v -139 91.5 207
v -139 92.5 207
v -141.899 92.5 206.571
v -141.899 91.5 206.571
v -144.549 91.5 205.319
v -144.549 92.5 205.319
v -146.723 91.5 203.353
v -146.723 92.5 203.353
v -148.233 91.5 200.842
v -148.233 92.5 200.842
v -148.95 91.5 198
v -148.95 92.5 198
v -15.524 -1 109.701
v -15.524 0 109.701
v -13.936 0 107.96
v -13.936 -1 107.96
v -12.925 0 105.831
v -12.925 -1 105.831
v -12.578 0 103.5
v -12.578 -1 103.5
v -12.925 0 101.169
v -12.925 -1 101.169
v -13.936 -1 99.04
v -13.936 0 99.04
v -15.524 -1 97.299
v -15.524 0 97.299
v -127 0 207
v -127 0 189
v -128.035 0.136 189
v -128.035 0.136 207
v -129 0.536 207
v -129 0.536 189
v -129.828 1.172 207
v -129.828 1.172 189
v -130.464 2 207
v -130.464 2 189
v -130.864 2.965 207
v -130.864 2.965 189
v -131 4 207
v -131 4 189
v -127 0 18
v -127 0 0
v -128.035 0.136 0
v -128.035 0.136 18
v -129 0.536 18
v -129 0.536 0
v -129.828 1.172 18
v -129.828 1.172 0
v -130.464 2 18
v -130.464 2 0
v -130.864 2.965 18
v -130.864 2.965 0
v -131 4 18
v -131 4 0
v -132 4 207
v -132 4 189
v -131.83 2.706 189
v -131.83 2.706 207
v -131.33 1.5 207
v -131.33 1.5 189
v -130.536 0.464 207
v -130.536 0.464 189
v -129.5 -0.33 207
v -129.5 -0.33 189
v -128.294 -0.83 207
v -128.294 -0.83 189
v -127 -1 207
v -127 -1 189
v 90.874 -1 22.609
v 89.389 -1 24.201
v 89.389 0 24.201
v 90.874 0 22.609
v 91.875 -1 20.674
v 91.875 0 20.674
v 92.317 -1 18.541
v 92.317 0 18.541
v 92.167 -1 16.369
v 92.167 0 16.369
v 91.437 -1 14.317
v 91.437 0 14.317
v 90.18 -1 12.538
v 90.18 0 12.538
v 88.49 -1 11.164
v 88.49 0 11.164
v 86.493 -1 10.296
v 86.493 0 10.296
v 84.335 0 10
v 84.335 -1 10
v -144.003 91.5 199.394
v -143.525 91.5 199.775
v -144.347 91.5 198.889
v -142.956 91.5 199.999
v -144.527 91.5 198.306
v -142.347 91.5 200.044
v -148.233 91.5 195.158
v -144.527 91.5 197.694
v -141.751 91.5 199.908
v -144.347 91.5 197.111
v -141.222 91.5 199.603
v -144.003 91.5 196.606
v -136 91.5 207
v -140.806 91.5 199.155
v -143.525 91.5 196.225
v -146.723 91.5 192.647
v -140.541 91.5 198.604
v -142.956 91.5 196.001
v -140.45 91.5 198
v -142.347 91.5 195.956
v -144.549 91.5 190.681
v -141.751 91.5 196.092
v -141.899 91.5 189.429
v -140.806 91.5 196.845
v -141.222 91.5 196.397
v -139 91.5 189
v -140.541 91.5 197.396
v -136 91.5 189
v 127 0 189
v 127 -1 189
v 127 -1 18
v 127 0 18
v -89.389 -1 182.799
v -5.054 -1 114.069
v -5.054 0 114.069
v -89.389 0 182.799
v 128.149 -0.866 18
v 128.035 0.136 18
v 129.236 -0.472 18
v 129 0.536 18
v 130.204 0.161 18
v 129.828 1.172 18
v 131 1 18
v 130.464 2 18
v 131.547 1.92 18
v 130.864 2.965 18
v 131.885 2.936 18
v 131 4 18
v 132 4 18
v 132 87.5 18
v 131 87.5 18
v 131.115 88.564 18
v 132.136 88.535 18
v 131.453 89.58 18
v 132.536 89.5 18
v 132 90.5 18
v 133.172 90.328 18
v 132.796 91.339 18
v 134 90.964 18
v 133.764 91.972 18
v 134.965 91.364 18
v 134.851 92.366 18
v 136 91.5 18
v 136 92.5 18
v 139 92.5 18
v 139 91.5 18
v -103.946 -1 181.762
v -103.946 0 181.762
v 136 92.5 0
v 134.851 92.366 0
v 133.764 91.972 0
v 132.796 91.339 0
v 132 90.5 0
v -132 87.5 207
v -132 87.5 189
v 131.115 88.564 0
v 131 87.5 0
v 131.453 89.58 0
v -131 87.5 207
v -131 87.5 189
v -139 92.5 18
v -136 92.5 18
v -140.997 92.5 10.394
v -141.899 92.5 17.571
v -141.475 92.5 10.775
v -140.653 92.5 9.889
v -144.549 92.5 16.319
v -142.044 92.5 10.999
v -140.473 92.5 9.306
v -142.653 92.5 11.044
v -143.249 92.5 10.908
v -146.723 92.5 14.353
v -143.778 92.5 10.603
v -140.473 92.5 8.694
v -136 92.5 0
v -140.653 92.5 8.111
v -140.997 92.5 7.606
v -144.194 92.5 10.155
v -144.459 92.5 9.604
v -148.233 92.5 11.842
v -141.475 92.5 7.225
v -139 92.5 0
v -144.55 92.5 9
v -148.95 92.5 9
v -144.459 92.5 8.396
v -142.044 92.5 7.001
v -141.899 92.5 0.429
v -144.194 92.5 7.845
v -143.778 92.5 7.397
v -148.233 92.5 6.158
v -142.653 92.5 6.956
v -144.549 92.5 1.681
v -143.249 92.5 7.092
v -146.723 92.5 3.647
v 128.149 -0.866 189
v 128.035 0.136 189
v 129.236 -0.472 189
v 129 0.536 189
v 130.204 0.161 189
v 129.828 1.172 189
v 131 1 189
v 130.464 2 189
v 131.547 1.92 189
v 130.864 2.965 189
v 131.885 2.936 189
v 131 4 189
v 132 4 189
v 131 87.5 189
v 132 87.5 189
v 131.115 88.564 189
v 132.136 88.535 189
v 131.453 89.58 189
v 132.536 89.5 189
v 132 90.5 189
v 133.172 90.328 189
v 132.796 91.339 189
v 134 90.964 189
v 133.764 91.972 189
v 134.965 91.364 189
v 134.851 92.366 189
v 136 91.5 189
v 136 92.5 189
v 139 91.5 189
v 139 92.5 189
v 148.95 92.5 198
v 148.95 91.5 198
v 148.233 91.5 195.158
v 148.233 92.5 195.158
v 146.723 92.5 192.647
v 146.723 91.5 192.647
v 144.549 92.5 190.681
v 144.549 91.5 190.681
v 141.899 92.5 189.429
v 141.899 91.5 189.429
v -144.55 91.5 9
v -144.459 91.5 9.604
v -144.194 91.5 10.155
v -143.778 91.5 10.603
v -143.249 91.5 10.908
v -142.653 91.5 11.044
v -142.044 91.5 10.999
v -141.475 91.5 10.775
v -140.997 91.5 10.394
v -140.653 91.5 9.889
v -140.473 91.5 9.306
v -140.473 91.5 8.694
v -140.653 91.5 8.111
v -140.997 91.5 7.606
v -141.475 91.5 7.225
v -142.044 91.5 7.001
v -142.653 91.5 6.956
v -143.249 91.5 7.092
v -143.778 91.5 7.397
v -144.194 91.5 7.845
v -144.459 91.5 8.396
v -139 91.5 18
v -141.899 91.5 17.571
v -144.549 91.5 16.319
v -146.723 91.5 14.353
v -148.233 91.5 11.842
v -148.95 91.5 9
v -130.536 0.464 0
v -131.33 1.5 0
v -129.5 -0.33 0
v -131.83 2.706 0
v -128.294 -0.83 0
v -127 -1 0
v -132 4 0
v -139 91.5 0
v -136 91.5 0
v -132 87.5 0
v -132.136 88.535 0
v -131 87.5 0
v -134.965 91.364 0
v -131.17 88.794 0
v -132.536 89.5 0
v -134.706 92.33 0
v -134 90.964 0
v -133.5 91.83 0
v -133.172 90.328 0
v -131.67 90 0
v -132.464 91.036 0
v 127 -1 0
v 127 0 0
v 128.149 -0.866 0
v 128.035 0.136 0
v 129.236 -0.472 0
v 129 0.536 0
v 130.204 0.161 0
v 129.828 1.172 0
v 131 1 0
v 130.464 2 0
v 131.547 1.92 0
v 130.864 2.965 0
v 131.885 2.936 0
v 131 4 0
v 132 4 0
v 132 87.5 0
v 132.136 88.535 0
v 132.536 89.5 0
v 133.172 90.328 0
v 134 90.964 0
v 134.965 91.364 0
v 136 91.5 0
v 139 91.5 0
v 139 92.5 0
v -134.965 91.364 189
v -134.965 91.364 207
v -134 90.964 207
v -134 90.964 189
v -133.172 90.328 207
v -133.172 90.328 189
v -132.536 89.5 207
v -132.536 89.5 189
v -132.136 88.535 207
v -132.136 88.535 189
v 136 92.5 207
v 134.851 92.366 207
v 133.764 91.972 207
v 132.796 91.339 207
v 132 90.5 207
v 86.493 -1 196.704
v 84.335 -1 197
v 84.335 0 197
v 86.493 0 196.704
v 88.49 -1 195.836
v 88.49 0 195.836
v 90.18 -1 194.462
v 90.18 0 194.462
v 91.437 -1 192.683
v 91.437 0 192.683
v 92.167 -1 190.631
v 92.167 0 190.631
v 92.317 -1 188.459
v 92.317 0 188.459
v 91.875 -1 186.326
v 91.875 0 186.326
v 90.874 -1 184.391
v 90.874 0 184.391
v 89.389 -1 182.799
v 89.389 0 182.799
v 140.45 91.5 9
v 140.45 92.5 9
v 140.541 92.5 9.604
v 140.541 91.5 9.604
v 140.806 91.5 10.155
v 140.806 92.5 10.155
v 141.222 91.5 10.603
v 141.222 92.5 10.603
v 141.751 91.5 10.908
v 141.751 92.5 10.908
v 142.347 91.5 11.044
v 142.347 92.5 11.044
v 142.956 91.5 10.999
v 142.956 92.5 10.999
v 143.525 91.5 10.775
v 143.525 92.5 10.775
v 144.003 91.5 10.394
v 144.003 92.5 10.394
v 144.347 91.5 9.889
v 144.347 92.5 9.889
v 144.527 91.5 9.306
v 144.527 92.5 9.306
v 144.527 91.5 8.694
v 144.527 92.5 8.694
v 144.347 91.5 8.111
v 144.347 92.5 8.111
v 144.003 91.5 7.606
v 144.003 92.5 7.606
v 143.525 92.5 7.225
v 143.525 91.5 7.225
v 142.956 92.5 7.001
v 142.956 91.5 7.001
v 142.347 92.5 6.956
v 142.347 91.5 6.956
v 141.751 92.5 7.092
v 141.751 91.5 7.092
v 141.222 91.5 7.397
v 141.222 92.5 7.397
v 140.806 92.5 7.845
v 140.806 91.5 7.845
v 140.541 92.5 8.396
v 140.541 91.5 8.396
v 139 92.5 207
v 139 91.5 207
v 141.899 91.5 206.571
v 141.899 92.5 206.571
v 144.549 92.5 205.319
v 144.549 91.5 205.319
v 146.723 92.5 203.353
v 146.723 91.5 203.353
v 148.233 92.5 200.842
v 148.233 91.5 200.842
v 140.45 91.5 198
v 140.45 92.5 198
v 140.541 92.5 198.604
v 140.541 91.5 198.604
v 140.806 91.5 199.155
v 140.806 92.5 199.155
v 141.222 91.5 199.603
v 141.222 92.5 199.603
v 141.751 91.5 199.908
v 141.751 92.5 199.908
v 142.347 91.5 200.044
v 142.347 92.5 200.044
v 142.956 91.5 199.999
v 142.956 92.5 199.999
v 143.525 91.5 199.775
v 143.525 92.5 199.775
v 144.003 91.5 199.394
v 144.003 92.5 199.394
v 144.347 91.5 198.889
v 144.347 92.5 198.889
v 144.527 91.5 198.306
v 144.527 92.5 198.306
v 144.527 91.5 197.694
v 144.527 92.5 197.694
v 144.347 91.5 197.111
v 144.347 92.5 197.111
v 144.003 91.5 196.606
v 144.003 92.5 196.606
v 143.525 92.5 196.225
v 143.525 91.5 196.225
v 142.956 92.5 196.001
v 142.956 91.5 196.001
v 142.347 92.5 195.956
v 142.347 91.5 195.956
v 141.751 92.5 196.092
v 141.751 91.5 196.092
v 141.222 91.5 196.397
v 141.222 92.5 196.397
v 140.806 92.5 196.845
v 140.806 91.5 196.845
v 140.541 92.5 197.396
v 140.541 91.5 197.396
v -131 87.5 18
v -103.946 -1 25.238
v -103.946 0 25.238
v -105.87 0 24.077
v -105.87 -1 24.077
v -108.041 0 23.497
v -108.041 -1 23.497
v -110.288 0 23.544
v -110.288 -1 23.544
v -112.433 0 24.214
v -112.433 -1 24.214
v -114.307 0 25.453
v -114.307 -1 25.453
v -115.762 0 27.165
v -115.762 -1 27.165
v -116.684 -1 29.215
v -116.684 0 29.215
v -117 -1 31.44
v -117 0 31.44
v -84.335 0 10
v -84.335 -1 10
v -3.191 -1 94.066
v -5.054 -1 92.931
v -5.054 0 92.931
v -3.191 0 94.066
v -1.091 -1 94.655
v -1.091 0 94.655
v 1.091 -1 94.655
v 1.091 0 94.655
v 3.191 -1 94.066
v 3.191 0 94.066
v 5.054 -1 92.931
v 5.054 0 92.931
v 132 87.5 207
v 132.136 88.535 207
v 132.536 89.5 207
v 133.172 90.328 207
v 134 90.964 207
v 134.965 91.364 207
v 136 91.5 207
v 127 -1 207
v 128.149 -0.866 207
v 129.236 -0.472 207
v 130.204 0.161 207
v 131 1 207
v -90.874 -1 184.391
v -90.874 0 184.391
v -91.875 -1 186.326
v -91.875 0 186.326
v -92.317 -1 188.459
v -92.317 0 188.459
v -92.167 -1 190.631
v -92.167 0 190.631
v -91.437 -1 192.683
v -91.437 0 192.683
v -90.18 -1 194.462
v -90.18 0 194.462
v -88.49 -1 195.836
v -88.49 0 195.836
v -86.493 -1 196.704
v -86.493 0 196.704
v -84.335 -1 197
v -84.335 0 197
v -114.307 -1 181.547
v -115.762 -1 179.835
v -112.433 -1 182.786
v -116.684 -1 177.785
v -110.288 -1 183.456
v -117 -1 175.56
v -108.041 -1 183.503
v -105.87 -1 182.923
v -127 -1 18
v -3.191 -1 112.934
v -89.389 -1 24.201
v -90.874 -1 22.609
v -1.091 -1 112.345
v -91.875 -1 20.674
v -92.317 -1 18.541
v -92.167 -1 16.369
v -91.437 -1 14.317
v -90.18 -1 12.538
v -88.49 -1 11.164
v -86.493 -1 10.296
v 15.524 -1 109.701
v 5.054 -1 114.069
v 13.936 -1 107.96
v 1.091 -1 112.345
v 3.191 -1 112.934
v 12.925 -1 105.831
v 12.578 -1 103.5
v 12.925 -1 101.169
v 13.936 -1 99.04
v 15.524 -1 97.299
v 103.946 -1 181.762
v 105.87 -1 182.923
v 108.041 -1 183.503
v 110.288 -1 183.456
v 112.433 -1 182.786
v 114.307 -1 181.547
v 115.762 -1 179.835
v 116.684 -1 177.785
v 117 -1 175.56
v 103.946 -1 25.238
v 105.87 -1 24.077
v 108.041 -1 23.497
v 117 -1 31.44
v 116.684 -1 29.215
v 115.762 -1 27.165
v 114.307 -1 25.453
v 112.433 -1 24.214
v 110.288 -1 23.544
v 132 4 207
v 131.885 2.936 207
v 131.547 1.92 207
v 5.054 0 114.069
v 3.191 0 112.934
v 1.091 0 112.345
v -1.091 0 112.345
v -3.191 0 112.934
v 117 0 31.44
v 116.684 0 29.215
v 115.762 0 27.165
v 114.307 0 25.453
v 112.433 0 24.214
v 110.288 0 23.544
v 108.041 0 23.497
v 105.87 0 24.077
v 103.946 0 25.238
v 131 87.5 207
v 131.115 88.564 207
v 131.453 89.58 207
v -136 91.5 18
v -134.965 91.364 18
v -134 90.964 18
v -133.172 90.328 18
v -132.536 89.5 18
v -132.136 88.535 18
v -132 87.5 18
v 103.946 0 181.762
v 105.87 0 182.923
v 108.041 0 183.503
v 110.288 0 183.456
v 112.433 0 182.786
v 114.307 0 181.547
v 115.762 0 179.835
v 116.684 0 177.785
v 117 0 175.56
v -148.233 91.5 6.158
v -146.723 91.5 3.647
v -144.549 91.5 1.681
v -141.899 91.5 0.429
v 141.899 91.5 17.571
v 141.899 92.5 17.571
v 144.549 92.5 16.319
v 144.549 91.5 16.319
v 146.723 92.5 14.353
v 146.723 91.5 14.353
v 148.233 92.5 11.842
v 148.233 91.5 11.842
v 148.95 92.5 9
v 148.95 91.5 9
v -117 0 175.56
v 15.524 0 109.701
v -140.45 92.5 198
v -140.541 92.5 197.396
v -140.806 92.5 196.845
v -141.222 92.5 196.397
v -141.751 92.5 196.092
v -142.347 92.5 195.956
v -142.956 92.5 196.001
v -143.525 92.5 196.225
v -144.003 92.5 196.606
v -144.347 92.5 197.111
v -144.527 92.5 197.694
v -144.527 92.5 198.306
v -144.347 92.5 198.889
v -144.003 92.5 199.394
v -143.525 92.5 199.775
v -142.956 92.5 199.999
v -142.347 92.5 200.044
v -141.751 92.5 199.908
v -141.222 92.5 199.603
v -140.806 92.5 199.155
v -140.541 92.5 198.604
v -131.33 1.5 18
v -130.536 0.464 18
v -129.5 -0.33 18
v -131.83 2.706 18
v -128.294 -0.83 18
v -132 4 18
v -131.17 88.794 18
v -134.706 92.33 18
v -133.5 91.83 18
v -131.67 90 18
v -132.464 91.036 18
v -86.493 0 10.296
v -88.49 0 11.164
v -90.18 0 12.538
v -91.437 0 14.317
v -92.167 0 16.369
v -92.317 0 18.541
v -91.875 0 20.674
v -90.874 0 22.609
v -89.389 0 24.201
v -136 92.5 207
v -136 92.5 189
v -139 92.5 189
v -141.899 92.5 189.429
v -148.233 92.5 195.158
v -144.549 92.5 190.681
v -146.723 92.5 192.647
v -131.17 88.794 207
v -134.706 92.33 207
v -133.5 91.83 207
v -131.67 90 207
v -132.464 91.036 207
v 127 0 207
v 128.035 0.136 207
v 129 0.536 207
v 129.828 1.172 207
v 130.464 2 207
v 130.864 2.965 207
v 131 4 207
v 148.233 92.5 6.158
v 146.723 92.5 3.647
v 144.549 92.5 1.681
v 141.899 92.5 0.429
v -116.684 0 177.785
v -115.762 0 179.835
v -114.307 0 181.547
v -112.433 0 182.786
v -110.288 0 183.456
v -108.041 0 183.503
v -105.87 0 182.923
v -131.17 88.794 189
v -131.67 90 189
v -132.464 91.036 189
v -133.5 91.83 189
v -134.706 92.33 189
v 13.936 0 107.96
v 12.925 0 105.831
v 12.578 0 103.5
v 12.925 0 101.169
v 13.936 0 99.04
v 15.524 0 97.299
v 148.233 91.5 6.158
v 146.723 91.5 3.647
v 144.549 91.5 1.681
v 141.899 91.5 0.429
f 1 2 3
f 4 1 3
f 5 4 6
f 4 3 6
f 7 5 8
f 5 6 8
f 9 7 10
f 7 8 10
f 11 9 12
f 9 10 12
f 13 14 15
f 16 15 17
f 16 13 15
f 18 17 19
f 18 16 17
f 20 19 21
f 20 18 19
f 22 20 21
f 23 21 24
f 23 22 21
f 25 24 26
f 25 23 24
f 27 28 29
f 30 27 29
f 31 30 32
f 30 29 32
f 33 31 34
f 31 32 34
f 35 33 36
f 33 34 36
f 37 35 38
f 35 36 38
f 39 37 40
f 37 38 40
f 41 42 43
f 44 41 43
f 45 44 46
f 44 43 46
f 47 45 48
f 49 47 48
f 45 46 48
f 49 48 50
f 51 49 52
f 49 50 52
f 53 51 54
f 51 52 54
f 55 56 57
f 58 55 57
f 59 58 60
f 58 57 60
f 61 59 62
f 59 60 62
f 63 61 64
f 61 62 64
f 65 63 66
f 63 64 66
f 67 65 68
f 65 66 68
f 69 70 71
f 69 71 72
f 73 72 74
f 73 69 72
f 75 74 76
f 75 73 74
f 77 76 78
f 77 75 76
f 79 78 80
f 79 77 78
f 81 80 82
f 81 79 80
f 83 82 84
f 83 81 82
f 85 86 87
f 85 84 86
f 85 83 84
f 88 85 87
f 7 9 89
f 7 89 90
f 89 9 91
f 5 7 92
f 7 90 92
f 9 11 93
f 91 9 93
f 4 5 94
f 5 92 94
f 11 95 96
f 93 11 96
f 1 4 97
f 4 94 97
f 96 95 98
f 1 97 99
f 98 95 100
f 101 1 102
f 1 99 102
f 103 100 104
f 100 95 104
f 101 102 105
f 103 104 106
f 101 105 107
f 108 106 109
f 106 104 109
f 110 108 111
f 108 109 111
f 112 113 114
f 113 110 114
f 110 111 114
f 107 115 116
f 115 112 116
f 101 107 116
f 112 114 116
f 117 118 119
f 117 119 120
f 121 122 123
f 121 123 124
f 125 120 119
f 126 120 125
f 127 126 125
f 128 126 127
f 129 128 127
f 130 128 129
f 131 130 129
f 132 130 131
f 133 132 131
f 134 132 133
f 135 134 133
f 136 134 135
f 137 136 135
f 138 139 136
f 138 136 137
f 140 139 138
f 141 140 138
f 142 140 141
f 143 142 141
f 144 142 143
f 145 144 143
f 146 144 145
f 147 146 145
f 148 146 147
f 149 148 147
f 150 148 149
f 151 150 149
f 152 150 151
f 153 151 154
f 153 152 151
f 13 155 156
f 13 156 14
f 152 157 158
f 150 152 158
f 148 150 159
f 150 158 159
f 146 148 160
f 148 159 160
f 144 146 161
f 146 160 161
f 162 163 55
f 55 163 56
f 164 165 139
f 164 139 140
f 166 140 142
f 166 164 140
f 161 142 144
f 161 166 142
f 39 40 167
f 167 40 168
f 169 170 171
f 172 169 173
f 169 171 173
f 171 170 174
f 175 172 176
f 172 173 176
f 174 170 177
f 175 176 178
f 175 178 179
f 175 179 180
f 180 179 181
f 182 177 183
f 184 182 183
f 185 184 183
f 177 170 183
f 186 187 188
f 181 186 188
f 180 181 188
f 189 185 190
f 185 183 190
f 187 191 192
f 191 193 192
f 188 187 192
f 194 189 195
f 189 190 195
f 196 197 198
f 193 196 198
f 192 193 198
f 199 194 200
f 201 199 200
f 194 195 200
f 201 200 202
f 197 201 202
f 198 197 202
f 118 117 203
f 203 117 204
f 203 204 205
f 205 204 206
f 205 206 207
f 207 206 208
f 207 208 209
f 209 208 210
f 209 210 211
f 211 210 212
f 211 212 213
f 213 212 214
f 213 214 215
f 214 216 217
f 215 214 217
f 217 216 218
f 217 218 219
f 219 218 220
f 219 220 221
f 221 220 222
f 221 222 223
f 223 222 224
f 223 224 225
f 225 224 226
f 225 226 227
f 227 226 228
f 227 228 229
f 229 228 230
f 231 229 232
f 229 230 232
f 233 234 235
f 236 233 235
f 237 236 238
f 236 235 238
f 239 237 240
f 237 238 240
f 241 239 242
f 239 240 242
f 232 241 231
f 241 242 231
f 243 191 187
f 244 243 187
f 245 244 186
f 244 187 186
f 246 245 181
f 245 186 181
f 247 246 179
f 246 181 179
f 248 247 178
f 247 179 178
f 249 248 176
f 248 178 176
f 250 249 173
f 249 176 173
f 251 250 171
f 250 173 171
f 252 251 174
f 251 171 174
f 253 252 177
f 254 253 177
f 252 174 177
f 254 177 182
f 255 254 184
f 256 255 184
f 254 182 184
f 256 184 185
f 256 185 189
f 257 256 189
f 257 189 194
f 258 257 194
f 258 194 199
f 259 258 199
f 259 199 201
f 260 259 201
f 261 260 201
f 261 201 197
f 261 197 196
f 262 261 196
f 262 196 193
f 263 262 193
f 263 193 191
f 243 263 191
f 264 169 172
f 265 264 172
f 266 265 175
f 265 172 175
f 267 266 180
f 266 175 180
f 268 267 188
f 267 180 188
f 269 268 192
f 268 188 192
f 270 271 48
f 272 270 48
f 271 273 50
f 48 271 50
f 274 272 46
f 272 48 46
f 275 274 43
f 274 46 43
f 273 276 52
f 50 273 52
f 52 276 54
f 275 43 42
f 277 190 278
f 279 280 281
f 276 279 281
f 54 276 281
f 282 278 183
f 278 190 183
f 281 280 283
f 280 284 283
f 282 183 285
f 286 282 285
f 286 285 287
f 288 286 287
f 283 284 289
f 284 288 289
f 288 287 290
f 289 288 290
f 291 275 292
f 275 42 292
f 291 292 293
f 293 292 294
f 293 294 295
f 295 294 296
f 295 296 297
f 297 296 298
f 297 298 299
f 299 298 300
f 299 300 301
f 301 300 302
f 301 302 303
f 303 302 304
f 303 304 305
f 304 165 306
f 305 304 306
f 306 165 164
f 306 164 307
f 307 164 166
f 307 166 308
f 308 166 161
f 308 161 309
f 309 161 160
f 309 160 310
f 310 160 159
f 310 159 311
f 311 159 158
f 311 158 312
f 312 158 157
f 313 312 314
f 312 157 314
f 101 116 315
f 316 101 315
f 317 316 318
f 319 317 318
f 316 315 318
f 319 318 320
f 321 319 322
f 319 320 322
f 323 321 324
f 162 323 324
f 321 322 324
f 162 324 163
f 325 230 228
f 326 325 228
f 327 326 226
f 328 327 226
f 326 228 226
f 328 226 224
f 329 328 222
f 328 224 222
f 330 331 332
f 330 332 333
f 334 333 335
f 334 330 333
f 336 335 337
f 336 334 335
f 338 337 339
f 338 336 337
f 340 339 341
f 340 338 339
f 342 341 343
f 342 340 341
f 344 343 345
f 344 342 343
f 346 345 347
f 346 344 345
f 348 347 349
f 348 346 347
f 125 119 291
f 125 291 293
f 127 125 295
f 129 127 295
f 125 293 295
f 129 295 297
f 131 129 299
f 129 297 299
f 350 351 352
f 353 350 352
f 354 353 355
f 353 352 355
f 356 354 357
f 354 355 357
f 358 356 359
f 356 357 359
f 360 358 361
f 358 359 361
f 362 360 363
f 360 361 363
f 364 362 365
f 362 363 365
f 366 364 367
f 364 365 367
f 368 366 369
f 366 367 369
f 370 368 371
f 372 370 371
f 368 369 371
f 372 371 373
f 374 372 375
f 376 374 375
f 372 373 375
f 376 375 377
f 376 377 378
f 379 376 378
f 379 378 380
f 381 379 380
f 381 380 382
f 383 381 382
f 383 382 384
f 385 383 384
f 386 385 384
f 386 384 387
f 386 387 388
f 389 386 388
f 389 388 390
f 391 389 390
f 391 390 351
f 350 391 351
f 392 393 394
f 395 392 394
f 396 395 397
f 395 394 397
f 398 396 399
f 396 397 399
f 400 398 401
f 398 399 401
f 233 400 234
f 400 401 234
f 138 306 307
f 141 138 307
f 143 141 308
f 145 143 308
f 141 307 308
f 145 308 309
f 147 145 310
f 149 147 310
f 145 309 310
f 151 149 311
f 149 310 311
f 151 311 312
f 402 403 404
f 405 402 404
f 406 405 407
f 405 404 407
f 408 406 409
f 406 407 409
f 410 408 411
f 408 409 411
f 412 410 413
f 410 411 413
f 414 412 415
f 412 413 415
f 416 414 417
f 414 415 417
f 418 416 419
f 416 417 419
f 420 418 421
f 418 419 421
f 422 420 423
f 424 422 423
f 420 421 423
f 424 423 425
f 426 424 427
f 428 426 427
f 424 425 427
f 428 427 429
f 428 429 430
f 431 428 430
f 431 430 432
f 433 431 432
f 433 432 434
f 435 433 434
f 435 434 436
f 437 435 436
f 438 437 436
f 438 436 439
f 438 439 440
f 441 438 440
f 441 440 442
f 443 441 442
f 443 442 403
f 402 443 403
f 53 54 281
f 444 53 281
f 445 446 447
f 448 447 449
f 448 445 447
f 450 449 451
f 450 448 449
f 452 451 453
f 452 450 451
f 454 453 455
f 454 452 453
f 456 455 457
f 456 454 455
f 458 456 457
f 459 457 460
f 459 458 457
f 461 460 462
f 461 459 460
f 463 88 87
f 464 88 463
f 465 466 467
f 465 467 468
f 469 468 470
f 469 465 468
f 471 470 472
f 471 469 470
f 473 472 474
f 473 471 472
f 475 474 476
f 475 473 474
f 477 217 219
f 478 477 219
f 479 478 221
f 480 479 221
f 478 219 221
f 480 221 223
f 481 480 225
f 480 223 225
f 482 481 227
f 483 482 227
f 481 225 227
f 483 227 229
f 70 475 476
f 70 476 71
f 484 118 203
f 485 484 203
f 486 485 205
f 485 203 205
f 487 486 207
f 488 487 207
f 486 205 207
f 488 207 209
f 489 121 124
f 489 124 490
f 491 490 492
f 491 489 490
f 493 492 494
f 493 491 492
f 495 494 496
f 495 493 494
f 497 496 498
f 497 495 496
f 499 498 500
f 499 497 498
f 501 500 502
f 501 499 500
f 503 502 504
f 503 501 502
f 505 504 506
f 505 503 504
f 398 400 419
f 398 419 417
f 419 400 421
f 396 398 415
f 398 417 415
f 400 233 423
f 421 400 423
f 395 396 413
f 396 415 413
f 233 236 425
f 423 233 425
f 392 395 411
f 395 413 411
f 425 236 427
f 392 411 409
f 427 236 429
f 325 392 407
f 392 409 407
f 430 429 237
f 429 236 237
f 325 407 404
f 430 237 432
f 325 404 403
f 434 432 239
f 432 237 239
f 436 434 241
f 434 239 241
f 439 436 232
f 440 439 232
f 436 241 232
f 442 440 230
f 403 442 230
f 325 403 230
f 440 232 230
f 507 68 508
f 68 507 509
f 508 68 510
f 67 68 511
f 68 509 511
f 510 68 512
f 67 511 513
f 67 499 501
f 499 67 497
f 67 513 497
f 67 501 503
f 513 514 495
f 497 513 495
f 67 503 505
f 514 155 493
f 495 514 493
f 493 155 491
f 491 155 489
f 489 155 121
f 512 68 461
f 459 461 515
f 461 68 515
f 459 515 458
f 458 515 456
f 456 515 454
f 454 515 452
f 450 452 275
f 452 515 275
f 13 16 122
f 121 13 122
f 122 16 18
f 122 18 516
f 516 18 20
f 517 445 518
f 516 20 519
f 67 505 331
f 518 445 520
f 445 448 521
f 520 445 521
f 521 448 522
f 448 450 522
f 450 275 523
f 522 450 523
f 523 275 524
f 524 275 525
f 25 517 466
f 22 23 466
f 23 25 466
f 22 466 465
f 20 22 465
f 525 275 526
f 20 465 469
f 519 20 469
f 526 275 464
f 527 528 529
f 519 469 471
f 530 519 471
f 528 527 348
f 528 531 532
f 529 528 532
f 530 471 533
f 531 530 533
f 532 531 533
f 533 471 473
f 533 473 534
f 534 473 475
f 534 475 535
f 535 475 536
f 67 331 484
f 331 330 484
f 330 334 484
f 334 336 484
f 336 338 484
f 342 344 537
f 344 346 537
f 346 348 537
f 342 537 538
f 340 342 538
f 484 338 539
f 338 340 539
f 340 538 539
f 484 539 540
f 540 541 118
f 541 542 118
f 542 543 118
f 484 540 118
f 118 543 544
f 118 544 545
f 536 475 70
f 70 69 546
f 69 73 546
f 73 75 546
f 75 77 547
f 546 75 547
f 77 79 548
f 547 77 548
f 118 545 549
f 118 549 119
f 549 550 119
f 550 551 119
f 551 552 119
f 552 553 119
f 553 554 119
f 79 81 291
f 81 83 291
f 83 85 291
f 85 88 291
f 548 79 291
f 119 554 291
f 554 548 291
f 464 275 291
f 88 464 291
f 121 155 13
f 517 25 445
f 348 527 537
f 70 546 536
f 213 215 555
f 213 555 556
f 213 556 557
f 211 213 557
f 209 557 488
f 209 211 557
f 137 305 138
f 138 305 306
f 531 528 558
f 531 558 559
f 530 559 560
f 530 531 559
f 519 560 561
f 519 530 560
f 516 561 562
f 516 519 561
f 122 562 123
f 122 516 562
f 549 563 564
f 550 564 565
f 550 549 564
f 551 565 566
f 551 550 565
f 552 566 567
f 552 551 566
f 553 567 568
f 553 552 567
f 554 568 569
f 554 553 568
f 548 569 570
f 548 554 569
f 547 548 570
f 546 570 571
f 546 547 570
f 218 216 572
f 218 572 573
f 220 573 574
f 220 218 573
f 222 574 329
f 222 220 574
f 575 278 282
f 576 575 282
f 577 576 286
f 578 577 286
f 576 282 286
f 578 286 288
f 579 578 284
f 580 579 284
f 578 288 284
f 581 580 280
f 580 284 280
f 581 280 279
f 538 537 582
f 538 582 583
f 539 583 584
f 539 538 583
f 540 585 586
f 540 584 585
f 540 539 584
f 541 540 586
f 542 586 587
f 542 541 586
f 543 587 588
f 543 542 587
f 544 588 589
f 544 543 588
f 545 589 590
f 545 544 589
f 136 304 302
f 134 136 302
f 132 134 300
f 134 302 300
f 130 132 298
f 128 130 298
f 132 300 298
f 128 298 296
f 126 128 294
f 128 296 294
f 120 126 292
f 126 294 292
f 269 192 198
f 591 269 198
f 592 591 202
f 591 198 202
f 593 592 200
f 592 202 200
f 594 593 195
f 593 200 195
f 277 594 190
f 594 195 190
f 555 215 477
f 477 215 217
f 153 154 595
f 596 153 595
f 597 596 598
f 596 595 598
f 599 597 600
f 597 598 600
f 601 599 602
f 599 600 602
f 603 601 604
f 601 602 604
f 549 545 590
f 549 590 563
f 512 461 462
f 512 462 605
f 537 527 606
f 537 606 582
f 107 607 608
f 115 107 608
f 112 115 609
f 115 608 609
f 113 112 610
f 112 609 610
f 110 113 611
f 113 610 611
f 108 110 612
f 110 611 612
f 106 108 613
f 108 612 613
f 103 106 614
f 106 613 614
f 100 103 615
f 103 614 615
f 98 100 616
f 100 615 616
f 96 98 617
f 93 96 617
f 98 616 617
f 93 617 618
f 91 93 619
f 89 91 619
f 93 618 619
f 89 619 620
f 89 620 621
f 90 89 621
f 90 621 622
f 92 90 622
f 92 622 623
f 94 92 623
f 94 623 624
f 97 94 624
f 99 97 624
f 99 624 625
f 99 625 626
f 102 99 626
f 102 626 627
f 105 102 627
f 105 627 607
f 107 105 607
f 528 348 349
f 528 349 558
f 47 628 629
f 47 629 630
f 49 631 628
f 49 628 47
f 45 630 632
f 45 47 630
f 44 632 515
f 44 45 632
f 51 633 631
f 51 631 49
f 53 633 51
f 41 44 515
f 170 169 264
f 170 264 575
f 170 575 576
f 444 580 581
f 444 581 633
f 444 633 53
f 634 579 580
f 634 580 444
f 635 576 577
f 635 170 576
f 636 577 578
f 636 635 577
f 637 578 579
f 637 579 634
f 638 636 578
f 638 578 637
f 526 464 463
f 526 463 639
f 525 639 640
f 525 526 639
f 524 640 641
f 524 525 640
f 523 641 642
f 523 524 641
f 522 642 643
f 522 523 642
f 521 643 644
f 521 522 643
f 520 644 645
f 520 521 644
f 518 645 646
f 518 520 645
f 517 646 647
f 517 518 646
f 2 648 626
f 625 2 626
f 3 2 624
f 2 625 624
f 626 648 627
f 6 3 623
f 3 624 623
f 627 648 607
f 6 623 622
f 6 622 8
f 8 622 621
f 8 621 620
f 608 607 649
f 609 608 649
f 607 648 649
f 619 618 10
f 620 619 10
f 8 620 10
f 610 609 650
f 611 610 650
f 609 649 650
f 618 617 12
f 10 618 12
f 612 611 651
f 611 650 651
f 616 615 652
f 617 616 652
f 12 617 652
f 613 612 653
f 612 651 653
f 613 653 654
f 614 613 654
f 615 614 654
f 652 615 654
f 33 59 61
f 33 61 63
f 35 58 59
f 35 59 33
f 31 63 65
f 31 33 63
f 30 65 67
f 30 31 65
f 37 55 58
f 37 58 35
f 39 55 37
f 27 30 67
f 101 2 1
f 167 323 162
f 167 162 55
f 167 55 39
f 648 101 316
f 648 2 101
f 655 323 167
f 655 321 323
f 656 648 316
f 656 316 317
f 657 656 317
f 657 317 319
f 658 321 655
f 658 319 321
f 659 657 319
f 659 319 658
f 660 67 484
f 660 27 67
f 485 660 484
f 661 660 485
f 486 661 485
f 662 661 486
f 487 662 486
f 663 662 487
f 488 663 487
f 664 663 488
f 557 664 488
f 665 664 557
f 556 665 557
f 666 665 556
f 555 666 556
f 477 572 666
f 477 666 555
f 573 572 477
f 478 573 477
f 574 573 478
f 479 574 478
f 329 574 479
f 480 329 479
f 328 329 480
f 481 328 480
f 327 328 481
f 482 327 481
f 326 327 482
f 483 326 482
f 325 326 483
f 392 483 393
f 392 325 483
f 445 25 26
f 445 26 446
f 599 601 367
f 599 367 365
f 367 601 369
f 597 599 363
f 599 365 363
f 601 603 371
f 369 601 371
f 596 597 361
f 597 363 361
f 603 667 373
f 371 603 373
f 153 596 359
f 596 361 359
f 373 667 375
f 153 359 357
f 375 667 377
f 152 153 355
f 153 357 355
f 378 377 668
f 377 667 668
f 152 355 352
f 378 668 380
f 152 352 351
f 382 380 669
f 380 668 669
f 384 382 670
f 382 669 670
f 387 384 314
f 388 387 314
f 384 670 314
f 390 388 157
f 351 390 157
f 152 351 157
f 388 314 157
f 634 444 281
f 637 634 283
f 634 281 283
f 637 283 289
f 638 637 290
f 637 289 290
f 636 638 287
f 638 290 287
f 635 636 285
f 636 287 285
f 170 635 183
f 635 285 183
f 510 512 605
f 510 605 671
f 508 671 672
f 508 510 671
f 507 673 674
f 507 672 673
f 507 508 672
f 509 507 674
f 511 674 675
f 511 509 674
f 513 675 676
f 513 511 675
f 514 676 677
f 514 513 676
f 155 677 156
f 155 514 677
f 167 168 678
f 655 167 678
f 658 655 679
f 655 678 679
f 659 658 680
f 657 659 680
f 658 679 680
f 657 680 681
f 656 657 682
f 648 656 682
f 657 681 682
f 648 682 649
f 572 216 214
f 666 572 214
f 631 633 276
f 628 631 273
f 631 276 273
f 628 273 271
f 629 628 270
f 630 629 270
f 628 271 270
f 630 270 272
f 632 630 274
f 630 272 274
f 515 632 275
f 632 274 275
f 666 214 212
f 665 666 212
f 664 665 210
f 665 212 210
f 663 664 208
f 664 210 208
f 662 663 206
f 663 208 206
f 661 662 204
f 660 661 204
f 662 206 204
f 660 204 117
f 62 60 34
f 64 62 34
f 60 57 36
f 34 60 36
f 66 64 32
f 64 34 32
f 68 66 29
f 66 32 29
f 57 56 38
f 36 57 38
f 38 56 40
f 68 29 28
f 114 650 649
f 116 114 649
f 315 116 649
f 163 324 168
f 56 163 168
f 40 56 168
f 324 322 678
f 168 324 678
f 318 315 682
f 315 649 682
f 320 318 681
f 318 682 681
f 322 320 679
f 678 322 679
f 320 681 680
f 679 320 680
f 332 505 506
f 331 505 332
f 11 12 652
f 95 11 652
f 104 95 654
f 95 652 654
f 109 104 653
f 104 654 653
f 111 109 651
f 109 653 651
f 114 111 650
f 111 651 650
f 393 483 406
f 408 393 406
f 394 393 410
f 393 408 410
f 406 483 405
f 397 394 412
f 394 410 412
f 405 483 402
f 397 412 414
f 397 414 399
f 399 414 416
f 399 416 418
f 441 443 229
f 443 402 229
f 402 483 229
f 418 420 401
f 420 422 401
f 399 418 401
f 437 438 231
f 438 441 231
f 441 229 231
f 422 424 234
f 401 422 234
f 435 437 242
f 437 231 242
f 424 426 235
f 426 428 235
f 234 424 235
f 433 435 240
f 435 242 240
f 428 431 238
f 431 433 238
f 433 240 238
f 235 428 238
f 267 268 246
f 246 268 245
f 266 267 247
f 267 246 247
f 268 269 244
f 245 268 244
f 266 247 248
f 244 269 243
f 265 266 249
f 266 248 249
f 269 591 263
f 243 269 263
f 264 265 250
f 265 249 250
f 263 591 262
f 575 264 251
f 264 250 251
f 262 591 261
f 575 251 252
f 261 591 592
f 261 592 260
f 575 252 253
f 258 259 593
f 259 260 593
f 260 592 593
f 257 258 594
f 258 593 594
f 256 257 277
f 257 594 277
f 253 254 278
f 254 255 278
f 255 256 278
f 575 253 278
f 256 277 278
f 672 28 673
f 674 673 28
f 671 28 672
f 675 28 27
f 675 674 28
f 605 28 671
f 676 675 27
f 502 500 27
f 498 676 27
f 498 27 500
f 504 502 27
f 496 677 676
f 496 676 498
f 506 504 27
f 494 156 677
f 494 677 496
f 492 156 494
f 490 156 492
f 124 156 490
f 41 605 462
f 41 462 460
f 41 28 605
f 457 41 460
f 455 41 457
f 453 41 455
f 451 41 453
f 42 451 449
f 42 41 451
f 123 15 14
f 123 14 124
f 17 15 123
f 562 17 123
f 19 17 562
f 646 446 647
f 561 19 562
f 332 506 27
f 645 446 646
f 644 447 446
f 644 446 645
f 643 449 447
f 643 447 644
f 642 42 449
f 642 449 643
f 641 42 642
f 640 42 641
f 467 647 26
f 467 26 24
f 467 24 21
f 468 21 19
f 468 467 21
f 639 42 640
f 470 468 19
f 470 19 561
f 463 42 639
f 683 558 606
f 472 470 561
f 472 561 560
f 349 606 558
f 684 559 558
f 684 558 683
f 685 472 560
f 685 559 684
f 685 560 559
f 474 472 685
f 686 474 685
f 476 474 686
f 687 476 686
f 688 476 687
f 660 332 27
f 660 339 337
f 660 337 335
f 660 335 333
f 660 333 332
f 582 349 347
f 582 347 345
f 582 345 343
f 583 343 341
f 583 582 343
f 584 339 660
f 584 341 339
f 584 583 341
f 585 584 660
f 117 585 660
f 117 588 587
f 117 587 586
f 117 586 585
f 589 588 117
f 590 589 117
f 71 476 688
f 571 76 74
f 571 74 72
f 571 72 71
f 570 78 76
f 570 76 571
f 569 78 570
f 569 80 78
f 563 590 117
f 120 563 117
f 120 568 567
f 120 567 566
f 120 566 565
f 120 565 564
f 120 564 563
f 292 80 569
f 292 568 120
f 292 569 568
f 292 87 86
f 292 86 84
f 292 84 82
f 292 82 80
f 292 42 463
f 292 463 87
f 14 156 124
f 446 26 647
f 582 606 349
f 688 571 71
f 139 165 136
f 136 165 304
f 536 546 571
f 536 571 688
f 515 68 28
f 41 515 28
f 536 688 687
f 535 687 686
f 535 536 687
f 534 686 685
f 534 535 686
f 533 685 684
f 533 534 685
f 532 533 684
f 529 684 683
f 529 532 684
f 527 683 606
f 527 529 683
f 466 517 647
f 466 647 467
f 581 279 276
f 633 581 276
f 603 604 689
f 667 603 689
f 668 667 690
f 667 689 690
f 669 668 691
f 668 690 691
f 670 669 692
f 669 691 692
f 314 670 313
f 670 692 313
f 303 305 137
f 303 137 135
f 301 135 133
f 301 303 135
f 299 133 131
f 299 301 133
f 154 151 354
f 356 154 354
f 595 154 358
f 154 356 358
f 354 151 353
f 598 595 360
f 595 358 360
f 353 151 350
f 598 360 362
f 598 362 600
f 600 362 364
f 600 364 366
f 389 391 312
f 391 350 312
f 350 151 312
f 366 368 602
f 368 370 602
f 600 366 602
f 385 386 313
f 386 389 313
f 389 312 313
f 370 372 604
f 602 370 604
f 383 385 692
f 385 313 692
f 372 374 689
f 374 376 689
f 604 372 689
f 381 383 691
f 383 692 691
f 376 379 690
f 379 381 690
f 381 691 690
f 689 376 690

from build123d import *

# Parameters (mm, degrees)
BASE_FLANGE1_DEPTH           = 207
EDGE_FLANGE1_STRIP_W         = 12
EDGE_FLANGE1_STRIP_H         = 1
EDGE_FLANGE1_STRIP_CUT_DEPTH = 207
EDGE_FLANGE1_DEPTH           = 207
EDGE_FLANGE2_STRIP_W         = 12
EDGE_FLANGE2_STRIP_H         = 1
EDGE_FLANGE2_STRIP_CUT_DEPTH = 207
EDGE_FLANGE2_DEPTH           = 207
UNFOLD1_DEPTH                = 207
UNFOLD1_2_DEPTH              = 207
SKETCH15_W                   = 171
SKETCH15_H                   = 112.207963268
CUT_EXTRUDE2_DEPTH           = 425.023399195
FOLD2_DEPTH                  = 207
FOLD2_2_OUTLINE_W            = 254
FOLD2_2_OUTLINE_H            = 1
FOLD2_2_DEPTH                = 207
FOLD2_3_DEPTH                = 18
FOLD2_START                  = 189
FOLD2_4_DEPTH                = 18
CUT_EXTRUDE3_DEPTH           = 272.647289698
SKETCH19_R                   = 2.05
CUT_EXTRUDE4_DEPTH           = 272.647289698
FILLET2_R                    = 10


# Read off the part's stored shape, not the designer's step: Unfold1, Fold2
# Sheet-metal steps are written as plain solids
with BuildPart() as part:
    # Sketch1 → Base-Flange1 (new body)
    with BuildSketch(Plane.XY):
        with BuildLine():
            Line((-131, 92.5), (-131, 4))
            ThreePointArc((-131, 4), (-129.828427125, 1.171572875), (-127, 0))
            Line((-127, 0), (127, 0))
            ThreePointArc((127, 0), (129.828427125, 1.171572875), (131, 4))
            Line((131, 4), (131, 92.5))
            Line((131, 92.5), (132, 92.5))
            Line((132, 92.5), (132, 4))
            ThreePointArc((132, 4), (130.535533906, 0.464466094), (127, -1))
            Line((127, -1), (-127, -1))
            ThreePointArc((-127, -1), (-130.535533906, 0.464466094), (-132, 4))
            Line((-132, 4), (-132, 92.5))
            Line((-132, 92.5), (-131, 92.5))
        make_face()
    extrude(amount=BASE_FLANGE1_DEPTH)

    # Edge-Flange1 strip (across the edge) → Edge-Flange1 strip cut (cut)
    with BuildSketch(Plane(origin=(132, 92.5, 0), x_dir=(0, -1, 0), z_dir=(0, 0, 1))):
        with Locations((-1, -0.5)):
            Rectangle(EDGE_FLANGE1_STRIP_W, EDGE_FLANGE1_STRIP_H)
    extrude(amount=EDGE_FLANGE1_STRIP_CUT_DEPTH, mode=Mode.SUBTRACT)

    # Edge-Flange1 section (across the edge) → Edge-Flange1 (add)
    with BuildSketch(Plane(origin=(132, 92.5, 0), x_dir=(0, -1, 0), z_dir=(0, 0, 1))):
        with BuildLine():
            Line((0, 4), (0, 17))
            Line((0, 17), (1, 17))
            Line((1, 17), (1, 4))
            ThreePointArc((1, 4), (2.171572875, 1.171572875), (5, 0))
            Line((5, 0), (5, -1))
            ThreePointArc((5, -1), (1.464466094, 0.464466094), (0, 4))
        make_face()
    extrude(amount=EDGE_FLANGE1_DEPTH)

    # Edge-Flange2 strip (across the edge) → Edge-Flange2 strip cut (cut)
    with BuildSketch(Plane(origin=(-132, 92.5, 207), x_dir=(0, -1, 0), z_dir=(0, 0, -1))):
        with Locations((-1, -0.5)):
            Rectangle(EDGE_FLANGE2_STRIP_W, EDGE_FLANGE2_STRIP_H)
    extrude(amount=EDGE_FLANGE2_STRIP_CUT_DEPTH, mode=Mode.SUBTRACT)

    # Edge-Flange2 section (across the edge) → Edge-Flange2 (add)
    with BuildSketch(Plane(origin=(-132, 92.5, 207), x_dir=(0, -1, 0), z_dir=(0, 0, -1))):
        with BuildLine():
            Line((0, 4), (0, 17))
            Line((0, 17), (1, 17))
            Line((1, 17), (1, 4))
            ThreePointArc((1, 4), (2.171572875, 1.171572875), (5, 0))
            Line((5, 0), (5, -1))
            ThreePointArc((5, -1), (1.464466094, 0.464466094), (0, 4))
        make_face()
    extrude(amount=EDGE_FLANGE2_DEPTH)

    # Unfold1 outline → Unfold1 (cut)
    with BuildSketch(Plane.XY):
        with BuildLine():
            ThreePointArc((127, -1), (129.236067977, -0.472135955), (131, 1))
            Line((131, 1), (131, 4))
            ThreePointArc((131, 4), (129.828427125, 1.171572875), (127, 0))
            Line((127, 0), (-127, 0))
            ThreePointArc((-127, 0), (-129.828427125, 1.171572875), (-131, 4))
            Line((-131, 4), (-131, 87.5))
            ThreePointArc((-131, 87.5), (-132.464466094, 91.035533906), (-136, 92.5))
            Line((-136, 92.5), (-149, 92.5))
            Line((-149, 92.5), (-149, 91.5))
            Line((-149, 91.5), (-136, 91.5))
            ThreePointArc((-136, 91.5), (-133.171572875, 90.328427125), (-132, 87.5))
            Line((-132, 87.5), (-132, 4))
            ThreePointArc((-132, 4), (-130.535533906, 0.464466094), (-127, -1))
            Line((-127, -1), (127, -1))
        make_face()
        with BuildLine():
            ThreePointArc((136, 92.5), (133.763932023, 91.972135955), (132, 90.5))
            Line((132, 90.5), (132, 87.5))
            ThreePointArc((132, 87.5), (133.171572875, 90.328427125), (136, 91.5))
            Line((136, 91.5), (149, 91.5))
            Line((149, 91.5), (149, 92.5))
            Line((149, 92.5), (136, 92.5))
        make_face()
    extrude(amount=UNFOLD1_DEPTH, mode=Mode.SUBTRACT)

    # Unfold1 2 outline → Unfold1 2 (add)
    with BuildSketch(Plane.XY):
        with BuildLine():
            Line((131, 1), (131, -370.061944902))
            Line((131, -370.061944902), (132, -370.061944902))
            Line((132, -370.061944902), (132, 4))
            ThreePointArc((132, 4), (131.74341649, 2.41886117), (131, 1))
        make_face()
        with BuildLine():
            Line((131, 108.353981634), (131, 87.5))
            ThreePointArc((131, 87.5), (131.25658351, 89.08113883), (132, 90.5))
            Line((132, 90.5), (132, 108.353981634))
            Line((132, 108.353981634), (131, 108.353981634))
        make_face()
    extrude(amount=UNFOLD1_2_DEPTH)

    # Sketch15 → Cut-Extrude2 (cut, through all)
    with BuildSketch(Plane.ZY.offset(-131)):
        with Locations((103.5, 52.25)):
            Rectangle(SKETCH15_W, SKETCH15_H)
        with Locations((103.5, -313.957963268)):
            Rectangle(SKETCH15_W, SKETCH15_H)
    extrude(amount=-CUT_EXTRUDE2_DEPTH, mode=Mode.SUBTRACT)

    # Fold2 outline → Fold2 (cut)
    with BuildSketch(Plane.XY):
        with BuildLine():
            ThreePointArc((132, 4), (131.74341649, 2.41886117), (131, 1))
            Line((131, 1), (131, -370.061944902))
            Line((131, -370.061944902), (132, -370.061944902))
            Line((132, -370.061944902), (132, 4))
        make_face()
        with BuildLine():
            ThreePointArc((131, 87.5), (131.25658351, 89.08113883), (132, 90.5))
            Line((132, 90.5), (132, 108.353981634))
            Line((132, 108.353981634), (131, 108.353981634))
            Line((131, 108.353981634), (131, 87.5))
        make_face()
    extrude(amount=FOLD2_DEPTH, mode=Mode.SUBTRACT)



with BuildPart() as body_2:
    # Fold2 2 outline → Fold2 2 (new body)
    with BuildSketch(Plane.XY):
        with Locations((0, -0.5)):
            Rectangle(FOLD2_2_OUTLINE_W, FOLD2_2_OUTLINE_H)
    extrude(amount=FOLD2_2_DEPTH)


with BuildPart() as part_1:
    add(part.part)

    add(body_2.part)  # Fold2 3 merges body 2
    # Fold2 3 outline → Fold2 3 (add)
    with BuildSketch(Plane.XY):
        with BuildLine():
            ThreePointArc((131, 4), (129.828427125, 1.171572875), (127, 0))
            Line((127, 0), (127, -1))
            ThreePointArc((127, -1), (129.236067977, -0.472135955), (131, 1))
            Line((131, 1), (131, 4))
        make_face()
        with BuildLine():
            Line((-127, -1), (-127, 0))
            ThreePointArc((-127, 0), (-129.828427125, 1.171572875), (-131, 4))
            Line((-131, 4), (-131, 87.5))
            ThreePointArc((-131, 87.5), (-132.464466094, 91.035533906), (-136, 92.5))
            Line((-136, 92.5), (-149, 92.5))
            Line((-149, 92.5), (-149, 91.5))
            Line((-149, 91.5), (-136, 91.5))
            ThreePointArc((-136, 91.5), (-133.171572875, 90.328427125), (-132, 87.5))
            Line((-132, 87.5), (-132, 4))
            ThreePointArc((-132, 4), (-130.535533906, 0.464466094), (-127, -1))
        make_face()
        with BuildLine():
            ThreePointArc((132, 87.5), (133.171572875, 90.328427125), (136, 91.5))
            Line((136, 91.5), (149, 91.5))
            Line((149, 91.5), (149, 92.5))
            Line((149, 92.5), (136, 92.5))
            ThreePointArc((136, 92.5), (133.763932023, 91.972135955), (132, 90.5))
            Line((132, 90.5), (132, 87.5))
        make_face()
    extrude(amount=FOLD2_3_DEPTH)

    # Fold2 4 outline → Fold2 4 (add)
    with BuildSketch(Plane.XY.offset(FOLD2_START)):
        with BuildLine():
            ThreePointArc((131, 4), (129.828427125, 1.171572875), (127, 0))
            Line((127, 0), (127, -1))
            ThreePointArc((127, -1), (129.236067977, -0.472135955), (131, 1))
            Line((131, 1), (131, 4))
        make_face()
        with BuildLine():
            Line((-127, -1), (-127, 0))
            ThreePointArc((-127, 0), (-129.828427125, 1.171572875), (-131, 4))
            Line((-131, 4), (-131, 87.5))
            ThreePointArc((-131, 87.5), (-132.464466094, 91.035533906), (-136, 92.5))
            Line((-136, 92.5), (-149, 92.5))
            Line((-149, 92.5), (-149, 91.5))
            Line((-149, 91.5), (-136, 91.5))
            ThreePointArc((-136, 91.5), (-133.171572875, 90.328427125), (-132, 87.5))
            Line((-132, 87.5), (-132, 4))
            ThreePointArc((-132, 4), (-130.535533906, 0.464466094), (-127, -1))
        make_face()
        with BuildLine():
            ThreePointArc((132, 87.5), (133.171572875, 90.328427125), (136, 91.5))
            Line((136, 91.5), (149, 91.5))
            Line((149, 91.5), (149, 92.5))
            Line((149, 92.5), (136, 92.5))
            ThreePointArc((136, 92.5), (133.763932023, 91.972135955), (132, 90.5))
            Line((132, 90.5), (132, 87.5))
        make_face()
    extrude(amount=FOLD2_4_DEPTH)

    # Sketch18 → Cut-Extrude3 (cut, through all)
    with BuildSketch(Plane.XZ.offset(1)):
        with BuildLine():
            Line((-103.946072958, 181.761839212), (-15.524130205, 109.701437047))
            ThreePointArc((-15.524130205, 109.701437047), (-12.578057247, 103.5), (-15.524130205, 97.298562953))
            Line((-15.524130205, 97.298562953), (-103.946072958, 25.238160788))
            ThreePointArc((-103.946072958, 25.238160788), (-112.432825634, 24.213554093), (-117, 31.439597835))
            Line((-117, 31.439597835), (-117, 175.560402165))
            ThreePointArc((-117, 175.560402165), (-112.432825634, 182.786445907), (-103.946072958, 181.761839212))
        make_face()
        with BuildLine():
            ThreePointArc((-89.388913274, 182.798562953), (-91.871945047, 191.682210247), (-84.334986231, 197))
            Line((-84.334986231, 197), (84.334986231, 197))
            ThreePointArc((84.334986231, 197), (91.871945047, 191.682210247), (89.388913274, 182.798562953))
            Line((89.388913274, 182.798562953), (5.053927042, 114.068869449))
            ThreePointArc((5.053927042, 114.068869449), (0, 112.270306496), (-5.053927042, 114.068869449))
            Line((-5.053927042, 114.068869449), (-89.388913274, 182.798562953))
        make_face()
        with BuildLine():
            ThreePointArc((103.946072958, 181.761839212), (112.432825634, 182.786445907), (117, 175.560402165))
            Line((117, 175.560402165), (117, 31.439597835))
            ThreePointArc((117, 31.439597835), (112.432825634, 24.213554093), (103.946072958, 25.238160788))
            Line((103.946072958, 25.238160788), (15.524130205, 97.298562953))
            ThreePointArc((15.524130205, 97.298562953), (12.578057247, 103.5), (15.524130205, 109.701437047))
            Line((15.524130205, 109.701437047), (103.946072958, 181.761839212))
        make_face()
        with BuildLine():
            Line((5.053927042, 92.931130551), (89.388913274, 24.201437047))
            ThreePointArc((89.388913274, 24.201437047), (91.871945047, 15.317789753), (84.334986231, 10))
            Line((84.334986231, 10), (-84.334986231, 10))
            ThreePointArc((-84.334986231, 10), (-91.871945047, 15.317789753), (-89.388913274, 24.201437047))
            Line((-89.388913274, 24.201437047), (-5.053927042, 92.931130551))
            ThreePointArc((-5.053927042, 92.931130551), (0, 94.729693504), (5.053927042, 92.931130551))
        make_face()
    extrude(amount=-CUT_EXTRUDE3_DEPTH, mode=Mode.SUBTRACT)

    # Sketch19 → Cut-Extrude4 (cut, through all)
    with BuildSketch(Plane(origin=(0, 92.5, 0), x_dir=(1, 0, 0), z_dir=(0, 1, 0))):
        with Locations(Location((142.5, -198, 0), (0, 0, 180))):
            Circle(SKETCH19_R)
        with Locations(Location((-142.5, -9, 0), (0, 0, 180))):
            Circle(SKETCH19_R)
        with Locations((-142.5, -198)):
            Circle(SKETCH19_R)
        with Locations(Location((142.5, -9, 0), (0, 0, 180))):
            Circle(SKETCH19_R)
    extrude(amount=-CUT_EXTRUDE4_DEPTH, mode=Mode.SUBTRACT)

    # Fillet2
    # the kernel refuses this fillet: 10 mm, written as the material it takes off along each edge
    with BuildSketch(Plane(origin=(149, 66.5, 0), x_dir=(-1, 0, 0), z_dir=(0, 1, 0)), Plane(origin=(149, 66.5, 189), x_dir=(-1, 0, 0), z_dir=(0, 1, 0)), Plane(origin=(-149, 117.5, 189), x_dir=(1, 0, 0), z_dir=(0, -1, 0)), Plane(origin=(-149, 117.5, 0), x_dir=(1, 0, 0), z_dir=(0, -1, 0)), Plane(origin=(-149, 117.5, 18), x_dir=(0, 0, -1), z_dir=(0, -1, 0))) as fillet2_piece_1:
        with BuildLine():
            CenterArc((FILLET2_R, FILLET2_R), FILLET2_R, 180, 90)
            Line((0, FILLET2_R), (0, 0))
            Line((0, 0), (FILLET2_R, 0))
        make_face()
    extrude(amount=51, mode=Mode.SUBTRACT)
    with BuildSketch(Plane(origin=(149, 66.5, 18), x_dir=(-1, 0, 0), z_dir=(0, 1, 0)), Plane(origin=(149, 66.5, 207), x_dir=(-1, 0, 0), z_dir=(0, 1, 0)), Plane(origin=(-149, 117.5, 207), x_dir=(1, 0, 0), z_dir=(0, -1, 0))) as fillet2_piece_2:
        with BuildLine():
            CenterArc((FILLET2_R, -FILLET2_R), FILLET2_R, 90, 90)
            Line((0, -FILLET2_R), (0, 0))
            Line((0, 0), (FILLET2_R, 0))
        make_face()
    extrude(amount=51, mode=Mode.SUBTRACT)


solid = part_1.part
